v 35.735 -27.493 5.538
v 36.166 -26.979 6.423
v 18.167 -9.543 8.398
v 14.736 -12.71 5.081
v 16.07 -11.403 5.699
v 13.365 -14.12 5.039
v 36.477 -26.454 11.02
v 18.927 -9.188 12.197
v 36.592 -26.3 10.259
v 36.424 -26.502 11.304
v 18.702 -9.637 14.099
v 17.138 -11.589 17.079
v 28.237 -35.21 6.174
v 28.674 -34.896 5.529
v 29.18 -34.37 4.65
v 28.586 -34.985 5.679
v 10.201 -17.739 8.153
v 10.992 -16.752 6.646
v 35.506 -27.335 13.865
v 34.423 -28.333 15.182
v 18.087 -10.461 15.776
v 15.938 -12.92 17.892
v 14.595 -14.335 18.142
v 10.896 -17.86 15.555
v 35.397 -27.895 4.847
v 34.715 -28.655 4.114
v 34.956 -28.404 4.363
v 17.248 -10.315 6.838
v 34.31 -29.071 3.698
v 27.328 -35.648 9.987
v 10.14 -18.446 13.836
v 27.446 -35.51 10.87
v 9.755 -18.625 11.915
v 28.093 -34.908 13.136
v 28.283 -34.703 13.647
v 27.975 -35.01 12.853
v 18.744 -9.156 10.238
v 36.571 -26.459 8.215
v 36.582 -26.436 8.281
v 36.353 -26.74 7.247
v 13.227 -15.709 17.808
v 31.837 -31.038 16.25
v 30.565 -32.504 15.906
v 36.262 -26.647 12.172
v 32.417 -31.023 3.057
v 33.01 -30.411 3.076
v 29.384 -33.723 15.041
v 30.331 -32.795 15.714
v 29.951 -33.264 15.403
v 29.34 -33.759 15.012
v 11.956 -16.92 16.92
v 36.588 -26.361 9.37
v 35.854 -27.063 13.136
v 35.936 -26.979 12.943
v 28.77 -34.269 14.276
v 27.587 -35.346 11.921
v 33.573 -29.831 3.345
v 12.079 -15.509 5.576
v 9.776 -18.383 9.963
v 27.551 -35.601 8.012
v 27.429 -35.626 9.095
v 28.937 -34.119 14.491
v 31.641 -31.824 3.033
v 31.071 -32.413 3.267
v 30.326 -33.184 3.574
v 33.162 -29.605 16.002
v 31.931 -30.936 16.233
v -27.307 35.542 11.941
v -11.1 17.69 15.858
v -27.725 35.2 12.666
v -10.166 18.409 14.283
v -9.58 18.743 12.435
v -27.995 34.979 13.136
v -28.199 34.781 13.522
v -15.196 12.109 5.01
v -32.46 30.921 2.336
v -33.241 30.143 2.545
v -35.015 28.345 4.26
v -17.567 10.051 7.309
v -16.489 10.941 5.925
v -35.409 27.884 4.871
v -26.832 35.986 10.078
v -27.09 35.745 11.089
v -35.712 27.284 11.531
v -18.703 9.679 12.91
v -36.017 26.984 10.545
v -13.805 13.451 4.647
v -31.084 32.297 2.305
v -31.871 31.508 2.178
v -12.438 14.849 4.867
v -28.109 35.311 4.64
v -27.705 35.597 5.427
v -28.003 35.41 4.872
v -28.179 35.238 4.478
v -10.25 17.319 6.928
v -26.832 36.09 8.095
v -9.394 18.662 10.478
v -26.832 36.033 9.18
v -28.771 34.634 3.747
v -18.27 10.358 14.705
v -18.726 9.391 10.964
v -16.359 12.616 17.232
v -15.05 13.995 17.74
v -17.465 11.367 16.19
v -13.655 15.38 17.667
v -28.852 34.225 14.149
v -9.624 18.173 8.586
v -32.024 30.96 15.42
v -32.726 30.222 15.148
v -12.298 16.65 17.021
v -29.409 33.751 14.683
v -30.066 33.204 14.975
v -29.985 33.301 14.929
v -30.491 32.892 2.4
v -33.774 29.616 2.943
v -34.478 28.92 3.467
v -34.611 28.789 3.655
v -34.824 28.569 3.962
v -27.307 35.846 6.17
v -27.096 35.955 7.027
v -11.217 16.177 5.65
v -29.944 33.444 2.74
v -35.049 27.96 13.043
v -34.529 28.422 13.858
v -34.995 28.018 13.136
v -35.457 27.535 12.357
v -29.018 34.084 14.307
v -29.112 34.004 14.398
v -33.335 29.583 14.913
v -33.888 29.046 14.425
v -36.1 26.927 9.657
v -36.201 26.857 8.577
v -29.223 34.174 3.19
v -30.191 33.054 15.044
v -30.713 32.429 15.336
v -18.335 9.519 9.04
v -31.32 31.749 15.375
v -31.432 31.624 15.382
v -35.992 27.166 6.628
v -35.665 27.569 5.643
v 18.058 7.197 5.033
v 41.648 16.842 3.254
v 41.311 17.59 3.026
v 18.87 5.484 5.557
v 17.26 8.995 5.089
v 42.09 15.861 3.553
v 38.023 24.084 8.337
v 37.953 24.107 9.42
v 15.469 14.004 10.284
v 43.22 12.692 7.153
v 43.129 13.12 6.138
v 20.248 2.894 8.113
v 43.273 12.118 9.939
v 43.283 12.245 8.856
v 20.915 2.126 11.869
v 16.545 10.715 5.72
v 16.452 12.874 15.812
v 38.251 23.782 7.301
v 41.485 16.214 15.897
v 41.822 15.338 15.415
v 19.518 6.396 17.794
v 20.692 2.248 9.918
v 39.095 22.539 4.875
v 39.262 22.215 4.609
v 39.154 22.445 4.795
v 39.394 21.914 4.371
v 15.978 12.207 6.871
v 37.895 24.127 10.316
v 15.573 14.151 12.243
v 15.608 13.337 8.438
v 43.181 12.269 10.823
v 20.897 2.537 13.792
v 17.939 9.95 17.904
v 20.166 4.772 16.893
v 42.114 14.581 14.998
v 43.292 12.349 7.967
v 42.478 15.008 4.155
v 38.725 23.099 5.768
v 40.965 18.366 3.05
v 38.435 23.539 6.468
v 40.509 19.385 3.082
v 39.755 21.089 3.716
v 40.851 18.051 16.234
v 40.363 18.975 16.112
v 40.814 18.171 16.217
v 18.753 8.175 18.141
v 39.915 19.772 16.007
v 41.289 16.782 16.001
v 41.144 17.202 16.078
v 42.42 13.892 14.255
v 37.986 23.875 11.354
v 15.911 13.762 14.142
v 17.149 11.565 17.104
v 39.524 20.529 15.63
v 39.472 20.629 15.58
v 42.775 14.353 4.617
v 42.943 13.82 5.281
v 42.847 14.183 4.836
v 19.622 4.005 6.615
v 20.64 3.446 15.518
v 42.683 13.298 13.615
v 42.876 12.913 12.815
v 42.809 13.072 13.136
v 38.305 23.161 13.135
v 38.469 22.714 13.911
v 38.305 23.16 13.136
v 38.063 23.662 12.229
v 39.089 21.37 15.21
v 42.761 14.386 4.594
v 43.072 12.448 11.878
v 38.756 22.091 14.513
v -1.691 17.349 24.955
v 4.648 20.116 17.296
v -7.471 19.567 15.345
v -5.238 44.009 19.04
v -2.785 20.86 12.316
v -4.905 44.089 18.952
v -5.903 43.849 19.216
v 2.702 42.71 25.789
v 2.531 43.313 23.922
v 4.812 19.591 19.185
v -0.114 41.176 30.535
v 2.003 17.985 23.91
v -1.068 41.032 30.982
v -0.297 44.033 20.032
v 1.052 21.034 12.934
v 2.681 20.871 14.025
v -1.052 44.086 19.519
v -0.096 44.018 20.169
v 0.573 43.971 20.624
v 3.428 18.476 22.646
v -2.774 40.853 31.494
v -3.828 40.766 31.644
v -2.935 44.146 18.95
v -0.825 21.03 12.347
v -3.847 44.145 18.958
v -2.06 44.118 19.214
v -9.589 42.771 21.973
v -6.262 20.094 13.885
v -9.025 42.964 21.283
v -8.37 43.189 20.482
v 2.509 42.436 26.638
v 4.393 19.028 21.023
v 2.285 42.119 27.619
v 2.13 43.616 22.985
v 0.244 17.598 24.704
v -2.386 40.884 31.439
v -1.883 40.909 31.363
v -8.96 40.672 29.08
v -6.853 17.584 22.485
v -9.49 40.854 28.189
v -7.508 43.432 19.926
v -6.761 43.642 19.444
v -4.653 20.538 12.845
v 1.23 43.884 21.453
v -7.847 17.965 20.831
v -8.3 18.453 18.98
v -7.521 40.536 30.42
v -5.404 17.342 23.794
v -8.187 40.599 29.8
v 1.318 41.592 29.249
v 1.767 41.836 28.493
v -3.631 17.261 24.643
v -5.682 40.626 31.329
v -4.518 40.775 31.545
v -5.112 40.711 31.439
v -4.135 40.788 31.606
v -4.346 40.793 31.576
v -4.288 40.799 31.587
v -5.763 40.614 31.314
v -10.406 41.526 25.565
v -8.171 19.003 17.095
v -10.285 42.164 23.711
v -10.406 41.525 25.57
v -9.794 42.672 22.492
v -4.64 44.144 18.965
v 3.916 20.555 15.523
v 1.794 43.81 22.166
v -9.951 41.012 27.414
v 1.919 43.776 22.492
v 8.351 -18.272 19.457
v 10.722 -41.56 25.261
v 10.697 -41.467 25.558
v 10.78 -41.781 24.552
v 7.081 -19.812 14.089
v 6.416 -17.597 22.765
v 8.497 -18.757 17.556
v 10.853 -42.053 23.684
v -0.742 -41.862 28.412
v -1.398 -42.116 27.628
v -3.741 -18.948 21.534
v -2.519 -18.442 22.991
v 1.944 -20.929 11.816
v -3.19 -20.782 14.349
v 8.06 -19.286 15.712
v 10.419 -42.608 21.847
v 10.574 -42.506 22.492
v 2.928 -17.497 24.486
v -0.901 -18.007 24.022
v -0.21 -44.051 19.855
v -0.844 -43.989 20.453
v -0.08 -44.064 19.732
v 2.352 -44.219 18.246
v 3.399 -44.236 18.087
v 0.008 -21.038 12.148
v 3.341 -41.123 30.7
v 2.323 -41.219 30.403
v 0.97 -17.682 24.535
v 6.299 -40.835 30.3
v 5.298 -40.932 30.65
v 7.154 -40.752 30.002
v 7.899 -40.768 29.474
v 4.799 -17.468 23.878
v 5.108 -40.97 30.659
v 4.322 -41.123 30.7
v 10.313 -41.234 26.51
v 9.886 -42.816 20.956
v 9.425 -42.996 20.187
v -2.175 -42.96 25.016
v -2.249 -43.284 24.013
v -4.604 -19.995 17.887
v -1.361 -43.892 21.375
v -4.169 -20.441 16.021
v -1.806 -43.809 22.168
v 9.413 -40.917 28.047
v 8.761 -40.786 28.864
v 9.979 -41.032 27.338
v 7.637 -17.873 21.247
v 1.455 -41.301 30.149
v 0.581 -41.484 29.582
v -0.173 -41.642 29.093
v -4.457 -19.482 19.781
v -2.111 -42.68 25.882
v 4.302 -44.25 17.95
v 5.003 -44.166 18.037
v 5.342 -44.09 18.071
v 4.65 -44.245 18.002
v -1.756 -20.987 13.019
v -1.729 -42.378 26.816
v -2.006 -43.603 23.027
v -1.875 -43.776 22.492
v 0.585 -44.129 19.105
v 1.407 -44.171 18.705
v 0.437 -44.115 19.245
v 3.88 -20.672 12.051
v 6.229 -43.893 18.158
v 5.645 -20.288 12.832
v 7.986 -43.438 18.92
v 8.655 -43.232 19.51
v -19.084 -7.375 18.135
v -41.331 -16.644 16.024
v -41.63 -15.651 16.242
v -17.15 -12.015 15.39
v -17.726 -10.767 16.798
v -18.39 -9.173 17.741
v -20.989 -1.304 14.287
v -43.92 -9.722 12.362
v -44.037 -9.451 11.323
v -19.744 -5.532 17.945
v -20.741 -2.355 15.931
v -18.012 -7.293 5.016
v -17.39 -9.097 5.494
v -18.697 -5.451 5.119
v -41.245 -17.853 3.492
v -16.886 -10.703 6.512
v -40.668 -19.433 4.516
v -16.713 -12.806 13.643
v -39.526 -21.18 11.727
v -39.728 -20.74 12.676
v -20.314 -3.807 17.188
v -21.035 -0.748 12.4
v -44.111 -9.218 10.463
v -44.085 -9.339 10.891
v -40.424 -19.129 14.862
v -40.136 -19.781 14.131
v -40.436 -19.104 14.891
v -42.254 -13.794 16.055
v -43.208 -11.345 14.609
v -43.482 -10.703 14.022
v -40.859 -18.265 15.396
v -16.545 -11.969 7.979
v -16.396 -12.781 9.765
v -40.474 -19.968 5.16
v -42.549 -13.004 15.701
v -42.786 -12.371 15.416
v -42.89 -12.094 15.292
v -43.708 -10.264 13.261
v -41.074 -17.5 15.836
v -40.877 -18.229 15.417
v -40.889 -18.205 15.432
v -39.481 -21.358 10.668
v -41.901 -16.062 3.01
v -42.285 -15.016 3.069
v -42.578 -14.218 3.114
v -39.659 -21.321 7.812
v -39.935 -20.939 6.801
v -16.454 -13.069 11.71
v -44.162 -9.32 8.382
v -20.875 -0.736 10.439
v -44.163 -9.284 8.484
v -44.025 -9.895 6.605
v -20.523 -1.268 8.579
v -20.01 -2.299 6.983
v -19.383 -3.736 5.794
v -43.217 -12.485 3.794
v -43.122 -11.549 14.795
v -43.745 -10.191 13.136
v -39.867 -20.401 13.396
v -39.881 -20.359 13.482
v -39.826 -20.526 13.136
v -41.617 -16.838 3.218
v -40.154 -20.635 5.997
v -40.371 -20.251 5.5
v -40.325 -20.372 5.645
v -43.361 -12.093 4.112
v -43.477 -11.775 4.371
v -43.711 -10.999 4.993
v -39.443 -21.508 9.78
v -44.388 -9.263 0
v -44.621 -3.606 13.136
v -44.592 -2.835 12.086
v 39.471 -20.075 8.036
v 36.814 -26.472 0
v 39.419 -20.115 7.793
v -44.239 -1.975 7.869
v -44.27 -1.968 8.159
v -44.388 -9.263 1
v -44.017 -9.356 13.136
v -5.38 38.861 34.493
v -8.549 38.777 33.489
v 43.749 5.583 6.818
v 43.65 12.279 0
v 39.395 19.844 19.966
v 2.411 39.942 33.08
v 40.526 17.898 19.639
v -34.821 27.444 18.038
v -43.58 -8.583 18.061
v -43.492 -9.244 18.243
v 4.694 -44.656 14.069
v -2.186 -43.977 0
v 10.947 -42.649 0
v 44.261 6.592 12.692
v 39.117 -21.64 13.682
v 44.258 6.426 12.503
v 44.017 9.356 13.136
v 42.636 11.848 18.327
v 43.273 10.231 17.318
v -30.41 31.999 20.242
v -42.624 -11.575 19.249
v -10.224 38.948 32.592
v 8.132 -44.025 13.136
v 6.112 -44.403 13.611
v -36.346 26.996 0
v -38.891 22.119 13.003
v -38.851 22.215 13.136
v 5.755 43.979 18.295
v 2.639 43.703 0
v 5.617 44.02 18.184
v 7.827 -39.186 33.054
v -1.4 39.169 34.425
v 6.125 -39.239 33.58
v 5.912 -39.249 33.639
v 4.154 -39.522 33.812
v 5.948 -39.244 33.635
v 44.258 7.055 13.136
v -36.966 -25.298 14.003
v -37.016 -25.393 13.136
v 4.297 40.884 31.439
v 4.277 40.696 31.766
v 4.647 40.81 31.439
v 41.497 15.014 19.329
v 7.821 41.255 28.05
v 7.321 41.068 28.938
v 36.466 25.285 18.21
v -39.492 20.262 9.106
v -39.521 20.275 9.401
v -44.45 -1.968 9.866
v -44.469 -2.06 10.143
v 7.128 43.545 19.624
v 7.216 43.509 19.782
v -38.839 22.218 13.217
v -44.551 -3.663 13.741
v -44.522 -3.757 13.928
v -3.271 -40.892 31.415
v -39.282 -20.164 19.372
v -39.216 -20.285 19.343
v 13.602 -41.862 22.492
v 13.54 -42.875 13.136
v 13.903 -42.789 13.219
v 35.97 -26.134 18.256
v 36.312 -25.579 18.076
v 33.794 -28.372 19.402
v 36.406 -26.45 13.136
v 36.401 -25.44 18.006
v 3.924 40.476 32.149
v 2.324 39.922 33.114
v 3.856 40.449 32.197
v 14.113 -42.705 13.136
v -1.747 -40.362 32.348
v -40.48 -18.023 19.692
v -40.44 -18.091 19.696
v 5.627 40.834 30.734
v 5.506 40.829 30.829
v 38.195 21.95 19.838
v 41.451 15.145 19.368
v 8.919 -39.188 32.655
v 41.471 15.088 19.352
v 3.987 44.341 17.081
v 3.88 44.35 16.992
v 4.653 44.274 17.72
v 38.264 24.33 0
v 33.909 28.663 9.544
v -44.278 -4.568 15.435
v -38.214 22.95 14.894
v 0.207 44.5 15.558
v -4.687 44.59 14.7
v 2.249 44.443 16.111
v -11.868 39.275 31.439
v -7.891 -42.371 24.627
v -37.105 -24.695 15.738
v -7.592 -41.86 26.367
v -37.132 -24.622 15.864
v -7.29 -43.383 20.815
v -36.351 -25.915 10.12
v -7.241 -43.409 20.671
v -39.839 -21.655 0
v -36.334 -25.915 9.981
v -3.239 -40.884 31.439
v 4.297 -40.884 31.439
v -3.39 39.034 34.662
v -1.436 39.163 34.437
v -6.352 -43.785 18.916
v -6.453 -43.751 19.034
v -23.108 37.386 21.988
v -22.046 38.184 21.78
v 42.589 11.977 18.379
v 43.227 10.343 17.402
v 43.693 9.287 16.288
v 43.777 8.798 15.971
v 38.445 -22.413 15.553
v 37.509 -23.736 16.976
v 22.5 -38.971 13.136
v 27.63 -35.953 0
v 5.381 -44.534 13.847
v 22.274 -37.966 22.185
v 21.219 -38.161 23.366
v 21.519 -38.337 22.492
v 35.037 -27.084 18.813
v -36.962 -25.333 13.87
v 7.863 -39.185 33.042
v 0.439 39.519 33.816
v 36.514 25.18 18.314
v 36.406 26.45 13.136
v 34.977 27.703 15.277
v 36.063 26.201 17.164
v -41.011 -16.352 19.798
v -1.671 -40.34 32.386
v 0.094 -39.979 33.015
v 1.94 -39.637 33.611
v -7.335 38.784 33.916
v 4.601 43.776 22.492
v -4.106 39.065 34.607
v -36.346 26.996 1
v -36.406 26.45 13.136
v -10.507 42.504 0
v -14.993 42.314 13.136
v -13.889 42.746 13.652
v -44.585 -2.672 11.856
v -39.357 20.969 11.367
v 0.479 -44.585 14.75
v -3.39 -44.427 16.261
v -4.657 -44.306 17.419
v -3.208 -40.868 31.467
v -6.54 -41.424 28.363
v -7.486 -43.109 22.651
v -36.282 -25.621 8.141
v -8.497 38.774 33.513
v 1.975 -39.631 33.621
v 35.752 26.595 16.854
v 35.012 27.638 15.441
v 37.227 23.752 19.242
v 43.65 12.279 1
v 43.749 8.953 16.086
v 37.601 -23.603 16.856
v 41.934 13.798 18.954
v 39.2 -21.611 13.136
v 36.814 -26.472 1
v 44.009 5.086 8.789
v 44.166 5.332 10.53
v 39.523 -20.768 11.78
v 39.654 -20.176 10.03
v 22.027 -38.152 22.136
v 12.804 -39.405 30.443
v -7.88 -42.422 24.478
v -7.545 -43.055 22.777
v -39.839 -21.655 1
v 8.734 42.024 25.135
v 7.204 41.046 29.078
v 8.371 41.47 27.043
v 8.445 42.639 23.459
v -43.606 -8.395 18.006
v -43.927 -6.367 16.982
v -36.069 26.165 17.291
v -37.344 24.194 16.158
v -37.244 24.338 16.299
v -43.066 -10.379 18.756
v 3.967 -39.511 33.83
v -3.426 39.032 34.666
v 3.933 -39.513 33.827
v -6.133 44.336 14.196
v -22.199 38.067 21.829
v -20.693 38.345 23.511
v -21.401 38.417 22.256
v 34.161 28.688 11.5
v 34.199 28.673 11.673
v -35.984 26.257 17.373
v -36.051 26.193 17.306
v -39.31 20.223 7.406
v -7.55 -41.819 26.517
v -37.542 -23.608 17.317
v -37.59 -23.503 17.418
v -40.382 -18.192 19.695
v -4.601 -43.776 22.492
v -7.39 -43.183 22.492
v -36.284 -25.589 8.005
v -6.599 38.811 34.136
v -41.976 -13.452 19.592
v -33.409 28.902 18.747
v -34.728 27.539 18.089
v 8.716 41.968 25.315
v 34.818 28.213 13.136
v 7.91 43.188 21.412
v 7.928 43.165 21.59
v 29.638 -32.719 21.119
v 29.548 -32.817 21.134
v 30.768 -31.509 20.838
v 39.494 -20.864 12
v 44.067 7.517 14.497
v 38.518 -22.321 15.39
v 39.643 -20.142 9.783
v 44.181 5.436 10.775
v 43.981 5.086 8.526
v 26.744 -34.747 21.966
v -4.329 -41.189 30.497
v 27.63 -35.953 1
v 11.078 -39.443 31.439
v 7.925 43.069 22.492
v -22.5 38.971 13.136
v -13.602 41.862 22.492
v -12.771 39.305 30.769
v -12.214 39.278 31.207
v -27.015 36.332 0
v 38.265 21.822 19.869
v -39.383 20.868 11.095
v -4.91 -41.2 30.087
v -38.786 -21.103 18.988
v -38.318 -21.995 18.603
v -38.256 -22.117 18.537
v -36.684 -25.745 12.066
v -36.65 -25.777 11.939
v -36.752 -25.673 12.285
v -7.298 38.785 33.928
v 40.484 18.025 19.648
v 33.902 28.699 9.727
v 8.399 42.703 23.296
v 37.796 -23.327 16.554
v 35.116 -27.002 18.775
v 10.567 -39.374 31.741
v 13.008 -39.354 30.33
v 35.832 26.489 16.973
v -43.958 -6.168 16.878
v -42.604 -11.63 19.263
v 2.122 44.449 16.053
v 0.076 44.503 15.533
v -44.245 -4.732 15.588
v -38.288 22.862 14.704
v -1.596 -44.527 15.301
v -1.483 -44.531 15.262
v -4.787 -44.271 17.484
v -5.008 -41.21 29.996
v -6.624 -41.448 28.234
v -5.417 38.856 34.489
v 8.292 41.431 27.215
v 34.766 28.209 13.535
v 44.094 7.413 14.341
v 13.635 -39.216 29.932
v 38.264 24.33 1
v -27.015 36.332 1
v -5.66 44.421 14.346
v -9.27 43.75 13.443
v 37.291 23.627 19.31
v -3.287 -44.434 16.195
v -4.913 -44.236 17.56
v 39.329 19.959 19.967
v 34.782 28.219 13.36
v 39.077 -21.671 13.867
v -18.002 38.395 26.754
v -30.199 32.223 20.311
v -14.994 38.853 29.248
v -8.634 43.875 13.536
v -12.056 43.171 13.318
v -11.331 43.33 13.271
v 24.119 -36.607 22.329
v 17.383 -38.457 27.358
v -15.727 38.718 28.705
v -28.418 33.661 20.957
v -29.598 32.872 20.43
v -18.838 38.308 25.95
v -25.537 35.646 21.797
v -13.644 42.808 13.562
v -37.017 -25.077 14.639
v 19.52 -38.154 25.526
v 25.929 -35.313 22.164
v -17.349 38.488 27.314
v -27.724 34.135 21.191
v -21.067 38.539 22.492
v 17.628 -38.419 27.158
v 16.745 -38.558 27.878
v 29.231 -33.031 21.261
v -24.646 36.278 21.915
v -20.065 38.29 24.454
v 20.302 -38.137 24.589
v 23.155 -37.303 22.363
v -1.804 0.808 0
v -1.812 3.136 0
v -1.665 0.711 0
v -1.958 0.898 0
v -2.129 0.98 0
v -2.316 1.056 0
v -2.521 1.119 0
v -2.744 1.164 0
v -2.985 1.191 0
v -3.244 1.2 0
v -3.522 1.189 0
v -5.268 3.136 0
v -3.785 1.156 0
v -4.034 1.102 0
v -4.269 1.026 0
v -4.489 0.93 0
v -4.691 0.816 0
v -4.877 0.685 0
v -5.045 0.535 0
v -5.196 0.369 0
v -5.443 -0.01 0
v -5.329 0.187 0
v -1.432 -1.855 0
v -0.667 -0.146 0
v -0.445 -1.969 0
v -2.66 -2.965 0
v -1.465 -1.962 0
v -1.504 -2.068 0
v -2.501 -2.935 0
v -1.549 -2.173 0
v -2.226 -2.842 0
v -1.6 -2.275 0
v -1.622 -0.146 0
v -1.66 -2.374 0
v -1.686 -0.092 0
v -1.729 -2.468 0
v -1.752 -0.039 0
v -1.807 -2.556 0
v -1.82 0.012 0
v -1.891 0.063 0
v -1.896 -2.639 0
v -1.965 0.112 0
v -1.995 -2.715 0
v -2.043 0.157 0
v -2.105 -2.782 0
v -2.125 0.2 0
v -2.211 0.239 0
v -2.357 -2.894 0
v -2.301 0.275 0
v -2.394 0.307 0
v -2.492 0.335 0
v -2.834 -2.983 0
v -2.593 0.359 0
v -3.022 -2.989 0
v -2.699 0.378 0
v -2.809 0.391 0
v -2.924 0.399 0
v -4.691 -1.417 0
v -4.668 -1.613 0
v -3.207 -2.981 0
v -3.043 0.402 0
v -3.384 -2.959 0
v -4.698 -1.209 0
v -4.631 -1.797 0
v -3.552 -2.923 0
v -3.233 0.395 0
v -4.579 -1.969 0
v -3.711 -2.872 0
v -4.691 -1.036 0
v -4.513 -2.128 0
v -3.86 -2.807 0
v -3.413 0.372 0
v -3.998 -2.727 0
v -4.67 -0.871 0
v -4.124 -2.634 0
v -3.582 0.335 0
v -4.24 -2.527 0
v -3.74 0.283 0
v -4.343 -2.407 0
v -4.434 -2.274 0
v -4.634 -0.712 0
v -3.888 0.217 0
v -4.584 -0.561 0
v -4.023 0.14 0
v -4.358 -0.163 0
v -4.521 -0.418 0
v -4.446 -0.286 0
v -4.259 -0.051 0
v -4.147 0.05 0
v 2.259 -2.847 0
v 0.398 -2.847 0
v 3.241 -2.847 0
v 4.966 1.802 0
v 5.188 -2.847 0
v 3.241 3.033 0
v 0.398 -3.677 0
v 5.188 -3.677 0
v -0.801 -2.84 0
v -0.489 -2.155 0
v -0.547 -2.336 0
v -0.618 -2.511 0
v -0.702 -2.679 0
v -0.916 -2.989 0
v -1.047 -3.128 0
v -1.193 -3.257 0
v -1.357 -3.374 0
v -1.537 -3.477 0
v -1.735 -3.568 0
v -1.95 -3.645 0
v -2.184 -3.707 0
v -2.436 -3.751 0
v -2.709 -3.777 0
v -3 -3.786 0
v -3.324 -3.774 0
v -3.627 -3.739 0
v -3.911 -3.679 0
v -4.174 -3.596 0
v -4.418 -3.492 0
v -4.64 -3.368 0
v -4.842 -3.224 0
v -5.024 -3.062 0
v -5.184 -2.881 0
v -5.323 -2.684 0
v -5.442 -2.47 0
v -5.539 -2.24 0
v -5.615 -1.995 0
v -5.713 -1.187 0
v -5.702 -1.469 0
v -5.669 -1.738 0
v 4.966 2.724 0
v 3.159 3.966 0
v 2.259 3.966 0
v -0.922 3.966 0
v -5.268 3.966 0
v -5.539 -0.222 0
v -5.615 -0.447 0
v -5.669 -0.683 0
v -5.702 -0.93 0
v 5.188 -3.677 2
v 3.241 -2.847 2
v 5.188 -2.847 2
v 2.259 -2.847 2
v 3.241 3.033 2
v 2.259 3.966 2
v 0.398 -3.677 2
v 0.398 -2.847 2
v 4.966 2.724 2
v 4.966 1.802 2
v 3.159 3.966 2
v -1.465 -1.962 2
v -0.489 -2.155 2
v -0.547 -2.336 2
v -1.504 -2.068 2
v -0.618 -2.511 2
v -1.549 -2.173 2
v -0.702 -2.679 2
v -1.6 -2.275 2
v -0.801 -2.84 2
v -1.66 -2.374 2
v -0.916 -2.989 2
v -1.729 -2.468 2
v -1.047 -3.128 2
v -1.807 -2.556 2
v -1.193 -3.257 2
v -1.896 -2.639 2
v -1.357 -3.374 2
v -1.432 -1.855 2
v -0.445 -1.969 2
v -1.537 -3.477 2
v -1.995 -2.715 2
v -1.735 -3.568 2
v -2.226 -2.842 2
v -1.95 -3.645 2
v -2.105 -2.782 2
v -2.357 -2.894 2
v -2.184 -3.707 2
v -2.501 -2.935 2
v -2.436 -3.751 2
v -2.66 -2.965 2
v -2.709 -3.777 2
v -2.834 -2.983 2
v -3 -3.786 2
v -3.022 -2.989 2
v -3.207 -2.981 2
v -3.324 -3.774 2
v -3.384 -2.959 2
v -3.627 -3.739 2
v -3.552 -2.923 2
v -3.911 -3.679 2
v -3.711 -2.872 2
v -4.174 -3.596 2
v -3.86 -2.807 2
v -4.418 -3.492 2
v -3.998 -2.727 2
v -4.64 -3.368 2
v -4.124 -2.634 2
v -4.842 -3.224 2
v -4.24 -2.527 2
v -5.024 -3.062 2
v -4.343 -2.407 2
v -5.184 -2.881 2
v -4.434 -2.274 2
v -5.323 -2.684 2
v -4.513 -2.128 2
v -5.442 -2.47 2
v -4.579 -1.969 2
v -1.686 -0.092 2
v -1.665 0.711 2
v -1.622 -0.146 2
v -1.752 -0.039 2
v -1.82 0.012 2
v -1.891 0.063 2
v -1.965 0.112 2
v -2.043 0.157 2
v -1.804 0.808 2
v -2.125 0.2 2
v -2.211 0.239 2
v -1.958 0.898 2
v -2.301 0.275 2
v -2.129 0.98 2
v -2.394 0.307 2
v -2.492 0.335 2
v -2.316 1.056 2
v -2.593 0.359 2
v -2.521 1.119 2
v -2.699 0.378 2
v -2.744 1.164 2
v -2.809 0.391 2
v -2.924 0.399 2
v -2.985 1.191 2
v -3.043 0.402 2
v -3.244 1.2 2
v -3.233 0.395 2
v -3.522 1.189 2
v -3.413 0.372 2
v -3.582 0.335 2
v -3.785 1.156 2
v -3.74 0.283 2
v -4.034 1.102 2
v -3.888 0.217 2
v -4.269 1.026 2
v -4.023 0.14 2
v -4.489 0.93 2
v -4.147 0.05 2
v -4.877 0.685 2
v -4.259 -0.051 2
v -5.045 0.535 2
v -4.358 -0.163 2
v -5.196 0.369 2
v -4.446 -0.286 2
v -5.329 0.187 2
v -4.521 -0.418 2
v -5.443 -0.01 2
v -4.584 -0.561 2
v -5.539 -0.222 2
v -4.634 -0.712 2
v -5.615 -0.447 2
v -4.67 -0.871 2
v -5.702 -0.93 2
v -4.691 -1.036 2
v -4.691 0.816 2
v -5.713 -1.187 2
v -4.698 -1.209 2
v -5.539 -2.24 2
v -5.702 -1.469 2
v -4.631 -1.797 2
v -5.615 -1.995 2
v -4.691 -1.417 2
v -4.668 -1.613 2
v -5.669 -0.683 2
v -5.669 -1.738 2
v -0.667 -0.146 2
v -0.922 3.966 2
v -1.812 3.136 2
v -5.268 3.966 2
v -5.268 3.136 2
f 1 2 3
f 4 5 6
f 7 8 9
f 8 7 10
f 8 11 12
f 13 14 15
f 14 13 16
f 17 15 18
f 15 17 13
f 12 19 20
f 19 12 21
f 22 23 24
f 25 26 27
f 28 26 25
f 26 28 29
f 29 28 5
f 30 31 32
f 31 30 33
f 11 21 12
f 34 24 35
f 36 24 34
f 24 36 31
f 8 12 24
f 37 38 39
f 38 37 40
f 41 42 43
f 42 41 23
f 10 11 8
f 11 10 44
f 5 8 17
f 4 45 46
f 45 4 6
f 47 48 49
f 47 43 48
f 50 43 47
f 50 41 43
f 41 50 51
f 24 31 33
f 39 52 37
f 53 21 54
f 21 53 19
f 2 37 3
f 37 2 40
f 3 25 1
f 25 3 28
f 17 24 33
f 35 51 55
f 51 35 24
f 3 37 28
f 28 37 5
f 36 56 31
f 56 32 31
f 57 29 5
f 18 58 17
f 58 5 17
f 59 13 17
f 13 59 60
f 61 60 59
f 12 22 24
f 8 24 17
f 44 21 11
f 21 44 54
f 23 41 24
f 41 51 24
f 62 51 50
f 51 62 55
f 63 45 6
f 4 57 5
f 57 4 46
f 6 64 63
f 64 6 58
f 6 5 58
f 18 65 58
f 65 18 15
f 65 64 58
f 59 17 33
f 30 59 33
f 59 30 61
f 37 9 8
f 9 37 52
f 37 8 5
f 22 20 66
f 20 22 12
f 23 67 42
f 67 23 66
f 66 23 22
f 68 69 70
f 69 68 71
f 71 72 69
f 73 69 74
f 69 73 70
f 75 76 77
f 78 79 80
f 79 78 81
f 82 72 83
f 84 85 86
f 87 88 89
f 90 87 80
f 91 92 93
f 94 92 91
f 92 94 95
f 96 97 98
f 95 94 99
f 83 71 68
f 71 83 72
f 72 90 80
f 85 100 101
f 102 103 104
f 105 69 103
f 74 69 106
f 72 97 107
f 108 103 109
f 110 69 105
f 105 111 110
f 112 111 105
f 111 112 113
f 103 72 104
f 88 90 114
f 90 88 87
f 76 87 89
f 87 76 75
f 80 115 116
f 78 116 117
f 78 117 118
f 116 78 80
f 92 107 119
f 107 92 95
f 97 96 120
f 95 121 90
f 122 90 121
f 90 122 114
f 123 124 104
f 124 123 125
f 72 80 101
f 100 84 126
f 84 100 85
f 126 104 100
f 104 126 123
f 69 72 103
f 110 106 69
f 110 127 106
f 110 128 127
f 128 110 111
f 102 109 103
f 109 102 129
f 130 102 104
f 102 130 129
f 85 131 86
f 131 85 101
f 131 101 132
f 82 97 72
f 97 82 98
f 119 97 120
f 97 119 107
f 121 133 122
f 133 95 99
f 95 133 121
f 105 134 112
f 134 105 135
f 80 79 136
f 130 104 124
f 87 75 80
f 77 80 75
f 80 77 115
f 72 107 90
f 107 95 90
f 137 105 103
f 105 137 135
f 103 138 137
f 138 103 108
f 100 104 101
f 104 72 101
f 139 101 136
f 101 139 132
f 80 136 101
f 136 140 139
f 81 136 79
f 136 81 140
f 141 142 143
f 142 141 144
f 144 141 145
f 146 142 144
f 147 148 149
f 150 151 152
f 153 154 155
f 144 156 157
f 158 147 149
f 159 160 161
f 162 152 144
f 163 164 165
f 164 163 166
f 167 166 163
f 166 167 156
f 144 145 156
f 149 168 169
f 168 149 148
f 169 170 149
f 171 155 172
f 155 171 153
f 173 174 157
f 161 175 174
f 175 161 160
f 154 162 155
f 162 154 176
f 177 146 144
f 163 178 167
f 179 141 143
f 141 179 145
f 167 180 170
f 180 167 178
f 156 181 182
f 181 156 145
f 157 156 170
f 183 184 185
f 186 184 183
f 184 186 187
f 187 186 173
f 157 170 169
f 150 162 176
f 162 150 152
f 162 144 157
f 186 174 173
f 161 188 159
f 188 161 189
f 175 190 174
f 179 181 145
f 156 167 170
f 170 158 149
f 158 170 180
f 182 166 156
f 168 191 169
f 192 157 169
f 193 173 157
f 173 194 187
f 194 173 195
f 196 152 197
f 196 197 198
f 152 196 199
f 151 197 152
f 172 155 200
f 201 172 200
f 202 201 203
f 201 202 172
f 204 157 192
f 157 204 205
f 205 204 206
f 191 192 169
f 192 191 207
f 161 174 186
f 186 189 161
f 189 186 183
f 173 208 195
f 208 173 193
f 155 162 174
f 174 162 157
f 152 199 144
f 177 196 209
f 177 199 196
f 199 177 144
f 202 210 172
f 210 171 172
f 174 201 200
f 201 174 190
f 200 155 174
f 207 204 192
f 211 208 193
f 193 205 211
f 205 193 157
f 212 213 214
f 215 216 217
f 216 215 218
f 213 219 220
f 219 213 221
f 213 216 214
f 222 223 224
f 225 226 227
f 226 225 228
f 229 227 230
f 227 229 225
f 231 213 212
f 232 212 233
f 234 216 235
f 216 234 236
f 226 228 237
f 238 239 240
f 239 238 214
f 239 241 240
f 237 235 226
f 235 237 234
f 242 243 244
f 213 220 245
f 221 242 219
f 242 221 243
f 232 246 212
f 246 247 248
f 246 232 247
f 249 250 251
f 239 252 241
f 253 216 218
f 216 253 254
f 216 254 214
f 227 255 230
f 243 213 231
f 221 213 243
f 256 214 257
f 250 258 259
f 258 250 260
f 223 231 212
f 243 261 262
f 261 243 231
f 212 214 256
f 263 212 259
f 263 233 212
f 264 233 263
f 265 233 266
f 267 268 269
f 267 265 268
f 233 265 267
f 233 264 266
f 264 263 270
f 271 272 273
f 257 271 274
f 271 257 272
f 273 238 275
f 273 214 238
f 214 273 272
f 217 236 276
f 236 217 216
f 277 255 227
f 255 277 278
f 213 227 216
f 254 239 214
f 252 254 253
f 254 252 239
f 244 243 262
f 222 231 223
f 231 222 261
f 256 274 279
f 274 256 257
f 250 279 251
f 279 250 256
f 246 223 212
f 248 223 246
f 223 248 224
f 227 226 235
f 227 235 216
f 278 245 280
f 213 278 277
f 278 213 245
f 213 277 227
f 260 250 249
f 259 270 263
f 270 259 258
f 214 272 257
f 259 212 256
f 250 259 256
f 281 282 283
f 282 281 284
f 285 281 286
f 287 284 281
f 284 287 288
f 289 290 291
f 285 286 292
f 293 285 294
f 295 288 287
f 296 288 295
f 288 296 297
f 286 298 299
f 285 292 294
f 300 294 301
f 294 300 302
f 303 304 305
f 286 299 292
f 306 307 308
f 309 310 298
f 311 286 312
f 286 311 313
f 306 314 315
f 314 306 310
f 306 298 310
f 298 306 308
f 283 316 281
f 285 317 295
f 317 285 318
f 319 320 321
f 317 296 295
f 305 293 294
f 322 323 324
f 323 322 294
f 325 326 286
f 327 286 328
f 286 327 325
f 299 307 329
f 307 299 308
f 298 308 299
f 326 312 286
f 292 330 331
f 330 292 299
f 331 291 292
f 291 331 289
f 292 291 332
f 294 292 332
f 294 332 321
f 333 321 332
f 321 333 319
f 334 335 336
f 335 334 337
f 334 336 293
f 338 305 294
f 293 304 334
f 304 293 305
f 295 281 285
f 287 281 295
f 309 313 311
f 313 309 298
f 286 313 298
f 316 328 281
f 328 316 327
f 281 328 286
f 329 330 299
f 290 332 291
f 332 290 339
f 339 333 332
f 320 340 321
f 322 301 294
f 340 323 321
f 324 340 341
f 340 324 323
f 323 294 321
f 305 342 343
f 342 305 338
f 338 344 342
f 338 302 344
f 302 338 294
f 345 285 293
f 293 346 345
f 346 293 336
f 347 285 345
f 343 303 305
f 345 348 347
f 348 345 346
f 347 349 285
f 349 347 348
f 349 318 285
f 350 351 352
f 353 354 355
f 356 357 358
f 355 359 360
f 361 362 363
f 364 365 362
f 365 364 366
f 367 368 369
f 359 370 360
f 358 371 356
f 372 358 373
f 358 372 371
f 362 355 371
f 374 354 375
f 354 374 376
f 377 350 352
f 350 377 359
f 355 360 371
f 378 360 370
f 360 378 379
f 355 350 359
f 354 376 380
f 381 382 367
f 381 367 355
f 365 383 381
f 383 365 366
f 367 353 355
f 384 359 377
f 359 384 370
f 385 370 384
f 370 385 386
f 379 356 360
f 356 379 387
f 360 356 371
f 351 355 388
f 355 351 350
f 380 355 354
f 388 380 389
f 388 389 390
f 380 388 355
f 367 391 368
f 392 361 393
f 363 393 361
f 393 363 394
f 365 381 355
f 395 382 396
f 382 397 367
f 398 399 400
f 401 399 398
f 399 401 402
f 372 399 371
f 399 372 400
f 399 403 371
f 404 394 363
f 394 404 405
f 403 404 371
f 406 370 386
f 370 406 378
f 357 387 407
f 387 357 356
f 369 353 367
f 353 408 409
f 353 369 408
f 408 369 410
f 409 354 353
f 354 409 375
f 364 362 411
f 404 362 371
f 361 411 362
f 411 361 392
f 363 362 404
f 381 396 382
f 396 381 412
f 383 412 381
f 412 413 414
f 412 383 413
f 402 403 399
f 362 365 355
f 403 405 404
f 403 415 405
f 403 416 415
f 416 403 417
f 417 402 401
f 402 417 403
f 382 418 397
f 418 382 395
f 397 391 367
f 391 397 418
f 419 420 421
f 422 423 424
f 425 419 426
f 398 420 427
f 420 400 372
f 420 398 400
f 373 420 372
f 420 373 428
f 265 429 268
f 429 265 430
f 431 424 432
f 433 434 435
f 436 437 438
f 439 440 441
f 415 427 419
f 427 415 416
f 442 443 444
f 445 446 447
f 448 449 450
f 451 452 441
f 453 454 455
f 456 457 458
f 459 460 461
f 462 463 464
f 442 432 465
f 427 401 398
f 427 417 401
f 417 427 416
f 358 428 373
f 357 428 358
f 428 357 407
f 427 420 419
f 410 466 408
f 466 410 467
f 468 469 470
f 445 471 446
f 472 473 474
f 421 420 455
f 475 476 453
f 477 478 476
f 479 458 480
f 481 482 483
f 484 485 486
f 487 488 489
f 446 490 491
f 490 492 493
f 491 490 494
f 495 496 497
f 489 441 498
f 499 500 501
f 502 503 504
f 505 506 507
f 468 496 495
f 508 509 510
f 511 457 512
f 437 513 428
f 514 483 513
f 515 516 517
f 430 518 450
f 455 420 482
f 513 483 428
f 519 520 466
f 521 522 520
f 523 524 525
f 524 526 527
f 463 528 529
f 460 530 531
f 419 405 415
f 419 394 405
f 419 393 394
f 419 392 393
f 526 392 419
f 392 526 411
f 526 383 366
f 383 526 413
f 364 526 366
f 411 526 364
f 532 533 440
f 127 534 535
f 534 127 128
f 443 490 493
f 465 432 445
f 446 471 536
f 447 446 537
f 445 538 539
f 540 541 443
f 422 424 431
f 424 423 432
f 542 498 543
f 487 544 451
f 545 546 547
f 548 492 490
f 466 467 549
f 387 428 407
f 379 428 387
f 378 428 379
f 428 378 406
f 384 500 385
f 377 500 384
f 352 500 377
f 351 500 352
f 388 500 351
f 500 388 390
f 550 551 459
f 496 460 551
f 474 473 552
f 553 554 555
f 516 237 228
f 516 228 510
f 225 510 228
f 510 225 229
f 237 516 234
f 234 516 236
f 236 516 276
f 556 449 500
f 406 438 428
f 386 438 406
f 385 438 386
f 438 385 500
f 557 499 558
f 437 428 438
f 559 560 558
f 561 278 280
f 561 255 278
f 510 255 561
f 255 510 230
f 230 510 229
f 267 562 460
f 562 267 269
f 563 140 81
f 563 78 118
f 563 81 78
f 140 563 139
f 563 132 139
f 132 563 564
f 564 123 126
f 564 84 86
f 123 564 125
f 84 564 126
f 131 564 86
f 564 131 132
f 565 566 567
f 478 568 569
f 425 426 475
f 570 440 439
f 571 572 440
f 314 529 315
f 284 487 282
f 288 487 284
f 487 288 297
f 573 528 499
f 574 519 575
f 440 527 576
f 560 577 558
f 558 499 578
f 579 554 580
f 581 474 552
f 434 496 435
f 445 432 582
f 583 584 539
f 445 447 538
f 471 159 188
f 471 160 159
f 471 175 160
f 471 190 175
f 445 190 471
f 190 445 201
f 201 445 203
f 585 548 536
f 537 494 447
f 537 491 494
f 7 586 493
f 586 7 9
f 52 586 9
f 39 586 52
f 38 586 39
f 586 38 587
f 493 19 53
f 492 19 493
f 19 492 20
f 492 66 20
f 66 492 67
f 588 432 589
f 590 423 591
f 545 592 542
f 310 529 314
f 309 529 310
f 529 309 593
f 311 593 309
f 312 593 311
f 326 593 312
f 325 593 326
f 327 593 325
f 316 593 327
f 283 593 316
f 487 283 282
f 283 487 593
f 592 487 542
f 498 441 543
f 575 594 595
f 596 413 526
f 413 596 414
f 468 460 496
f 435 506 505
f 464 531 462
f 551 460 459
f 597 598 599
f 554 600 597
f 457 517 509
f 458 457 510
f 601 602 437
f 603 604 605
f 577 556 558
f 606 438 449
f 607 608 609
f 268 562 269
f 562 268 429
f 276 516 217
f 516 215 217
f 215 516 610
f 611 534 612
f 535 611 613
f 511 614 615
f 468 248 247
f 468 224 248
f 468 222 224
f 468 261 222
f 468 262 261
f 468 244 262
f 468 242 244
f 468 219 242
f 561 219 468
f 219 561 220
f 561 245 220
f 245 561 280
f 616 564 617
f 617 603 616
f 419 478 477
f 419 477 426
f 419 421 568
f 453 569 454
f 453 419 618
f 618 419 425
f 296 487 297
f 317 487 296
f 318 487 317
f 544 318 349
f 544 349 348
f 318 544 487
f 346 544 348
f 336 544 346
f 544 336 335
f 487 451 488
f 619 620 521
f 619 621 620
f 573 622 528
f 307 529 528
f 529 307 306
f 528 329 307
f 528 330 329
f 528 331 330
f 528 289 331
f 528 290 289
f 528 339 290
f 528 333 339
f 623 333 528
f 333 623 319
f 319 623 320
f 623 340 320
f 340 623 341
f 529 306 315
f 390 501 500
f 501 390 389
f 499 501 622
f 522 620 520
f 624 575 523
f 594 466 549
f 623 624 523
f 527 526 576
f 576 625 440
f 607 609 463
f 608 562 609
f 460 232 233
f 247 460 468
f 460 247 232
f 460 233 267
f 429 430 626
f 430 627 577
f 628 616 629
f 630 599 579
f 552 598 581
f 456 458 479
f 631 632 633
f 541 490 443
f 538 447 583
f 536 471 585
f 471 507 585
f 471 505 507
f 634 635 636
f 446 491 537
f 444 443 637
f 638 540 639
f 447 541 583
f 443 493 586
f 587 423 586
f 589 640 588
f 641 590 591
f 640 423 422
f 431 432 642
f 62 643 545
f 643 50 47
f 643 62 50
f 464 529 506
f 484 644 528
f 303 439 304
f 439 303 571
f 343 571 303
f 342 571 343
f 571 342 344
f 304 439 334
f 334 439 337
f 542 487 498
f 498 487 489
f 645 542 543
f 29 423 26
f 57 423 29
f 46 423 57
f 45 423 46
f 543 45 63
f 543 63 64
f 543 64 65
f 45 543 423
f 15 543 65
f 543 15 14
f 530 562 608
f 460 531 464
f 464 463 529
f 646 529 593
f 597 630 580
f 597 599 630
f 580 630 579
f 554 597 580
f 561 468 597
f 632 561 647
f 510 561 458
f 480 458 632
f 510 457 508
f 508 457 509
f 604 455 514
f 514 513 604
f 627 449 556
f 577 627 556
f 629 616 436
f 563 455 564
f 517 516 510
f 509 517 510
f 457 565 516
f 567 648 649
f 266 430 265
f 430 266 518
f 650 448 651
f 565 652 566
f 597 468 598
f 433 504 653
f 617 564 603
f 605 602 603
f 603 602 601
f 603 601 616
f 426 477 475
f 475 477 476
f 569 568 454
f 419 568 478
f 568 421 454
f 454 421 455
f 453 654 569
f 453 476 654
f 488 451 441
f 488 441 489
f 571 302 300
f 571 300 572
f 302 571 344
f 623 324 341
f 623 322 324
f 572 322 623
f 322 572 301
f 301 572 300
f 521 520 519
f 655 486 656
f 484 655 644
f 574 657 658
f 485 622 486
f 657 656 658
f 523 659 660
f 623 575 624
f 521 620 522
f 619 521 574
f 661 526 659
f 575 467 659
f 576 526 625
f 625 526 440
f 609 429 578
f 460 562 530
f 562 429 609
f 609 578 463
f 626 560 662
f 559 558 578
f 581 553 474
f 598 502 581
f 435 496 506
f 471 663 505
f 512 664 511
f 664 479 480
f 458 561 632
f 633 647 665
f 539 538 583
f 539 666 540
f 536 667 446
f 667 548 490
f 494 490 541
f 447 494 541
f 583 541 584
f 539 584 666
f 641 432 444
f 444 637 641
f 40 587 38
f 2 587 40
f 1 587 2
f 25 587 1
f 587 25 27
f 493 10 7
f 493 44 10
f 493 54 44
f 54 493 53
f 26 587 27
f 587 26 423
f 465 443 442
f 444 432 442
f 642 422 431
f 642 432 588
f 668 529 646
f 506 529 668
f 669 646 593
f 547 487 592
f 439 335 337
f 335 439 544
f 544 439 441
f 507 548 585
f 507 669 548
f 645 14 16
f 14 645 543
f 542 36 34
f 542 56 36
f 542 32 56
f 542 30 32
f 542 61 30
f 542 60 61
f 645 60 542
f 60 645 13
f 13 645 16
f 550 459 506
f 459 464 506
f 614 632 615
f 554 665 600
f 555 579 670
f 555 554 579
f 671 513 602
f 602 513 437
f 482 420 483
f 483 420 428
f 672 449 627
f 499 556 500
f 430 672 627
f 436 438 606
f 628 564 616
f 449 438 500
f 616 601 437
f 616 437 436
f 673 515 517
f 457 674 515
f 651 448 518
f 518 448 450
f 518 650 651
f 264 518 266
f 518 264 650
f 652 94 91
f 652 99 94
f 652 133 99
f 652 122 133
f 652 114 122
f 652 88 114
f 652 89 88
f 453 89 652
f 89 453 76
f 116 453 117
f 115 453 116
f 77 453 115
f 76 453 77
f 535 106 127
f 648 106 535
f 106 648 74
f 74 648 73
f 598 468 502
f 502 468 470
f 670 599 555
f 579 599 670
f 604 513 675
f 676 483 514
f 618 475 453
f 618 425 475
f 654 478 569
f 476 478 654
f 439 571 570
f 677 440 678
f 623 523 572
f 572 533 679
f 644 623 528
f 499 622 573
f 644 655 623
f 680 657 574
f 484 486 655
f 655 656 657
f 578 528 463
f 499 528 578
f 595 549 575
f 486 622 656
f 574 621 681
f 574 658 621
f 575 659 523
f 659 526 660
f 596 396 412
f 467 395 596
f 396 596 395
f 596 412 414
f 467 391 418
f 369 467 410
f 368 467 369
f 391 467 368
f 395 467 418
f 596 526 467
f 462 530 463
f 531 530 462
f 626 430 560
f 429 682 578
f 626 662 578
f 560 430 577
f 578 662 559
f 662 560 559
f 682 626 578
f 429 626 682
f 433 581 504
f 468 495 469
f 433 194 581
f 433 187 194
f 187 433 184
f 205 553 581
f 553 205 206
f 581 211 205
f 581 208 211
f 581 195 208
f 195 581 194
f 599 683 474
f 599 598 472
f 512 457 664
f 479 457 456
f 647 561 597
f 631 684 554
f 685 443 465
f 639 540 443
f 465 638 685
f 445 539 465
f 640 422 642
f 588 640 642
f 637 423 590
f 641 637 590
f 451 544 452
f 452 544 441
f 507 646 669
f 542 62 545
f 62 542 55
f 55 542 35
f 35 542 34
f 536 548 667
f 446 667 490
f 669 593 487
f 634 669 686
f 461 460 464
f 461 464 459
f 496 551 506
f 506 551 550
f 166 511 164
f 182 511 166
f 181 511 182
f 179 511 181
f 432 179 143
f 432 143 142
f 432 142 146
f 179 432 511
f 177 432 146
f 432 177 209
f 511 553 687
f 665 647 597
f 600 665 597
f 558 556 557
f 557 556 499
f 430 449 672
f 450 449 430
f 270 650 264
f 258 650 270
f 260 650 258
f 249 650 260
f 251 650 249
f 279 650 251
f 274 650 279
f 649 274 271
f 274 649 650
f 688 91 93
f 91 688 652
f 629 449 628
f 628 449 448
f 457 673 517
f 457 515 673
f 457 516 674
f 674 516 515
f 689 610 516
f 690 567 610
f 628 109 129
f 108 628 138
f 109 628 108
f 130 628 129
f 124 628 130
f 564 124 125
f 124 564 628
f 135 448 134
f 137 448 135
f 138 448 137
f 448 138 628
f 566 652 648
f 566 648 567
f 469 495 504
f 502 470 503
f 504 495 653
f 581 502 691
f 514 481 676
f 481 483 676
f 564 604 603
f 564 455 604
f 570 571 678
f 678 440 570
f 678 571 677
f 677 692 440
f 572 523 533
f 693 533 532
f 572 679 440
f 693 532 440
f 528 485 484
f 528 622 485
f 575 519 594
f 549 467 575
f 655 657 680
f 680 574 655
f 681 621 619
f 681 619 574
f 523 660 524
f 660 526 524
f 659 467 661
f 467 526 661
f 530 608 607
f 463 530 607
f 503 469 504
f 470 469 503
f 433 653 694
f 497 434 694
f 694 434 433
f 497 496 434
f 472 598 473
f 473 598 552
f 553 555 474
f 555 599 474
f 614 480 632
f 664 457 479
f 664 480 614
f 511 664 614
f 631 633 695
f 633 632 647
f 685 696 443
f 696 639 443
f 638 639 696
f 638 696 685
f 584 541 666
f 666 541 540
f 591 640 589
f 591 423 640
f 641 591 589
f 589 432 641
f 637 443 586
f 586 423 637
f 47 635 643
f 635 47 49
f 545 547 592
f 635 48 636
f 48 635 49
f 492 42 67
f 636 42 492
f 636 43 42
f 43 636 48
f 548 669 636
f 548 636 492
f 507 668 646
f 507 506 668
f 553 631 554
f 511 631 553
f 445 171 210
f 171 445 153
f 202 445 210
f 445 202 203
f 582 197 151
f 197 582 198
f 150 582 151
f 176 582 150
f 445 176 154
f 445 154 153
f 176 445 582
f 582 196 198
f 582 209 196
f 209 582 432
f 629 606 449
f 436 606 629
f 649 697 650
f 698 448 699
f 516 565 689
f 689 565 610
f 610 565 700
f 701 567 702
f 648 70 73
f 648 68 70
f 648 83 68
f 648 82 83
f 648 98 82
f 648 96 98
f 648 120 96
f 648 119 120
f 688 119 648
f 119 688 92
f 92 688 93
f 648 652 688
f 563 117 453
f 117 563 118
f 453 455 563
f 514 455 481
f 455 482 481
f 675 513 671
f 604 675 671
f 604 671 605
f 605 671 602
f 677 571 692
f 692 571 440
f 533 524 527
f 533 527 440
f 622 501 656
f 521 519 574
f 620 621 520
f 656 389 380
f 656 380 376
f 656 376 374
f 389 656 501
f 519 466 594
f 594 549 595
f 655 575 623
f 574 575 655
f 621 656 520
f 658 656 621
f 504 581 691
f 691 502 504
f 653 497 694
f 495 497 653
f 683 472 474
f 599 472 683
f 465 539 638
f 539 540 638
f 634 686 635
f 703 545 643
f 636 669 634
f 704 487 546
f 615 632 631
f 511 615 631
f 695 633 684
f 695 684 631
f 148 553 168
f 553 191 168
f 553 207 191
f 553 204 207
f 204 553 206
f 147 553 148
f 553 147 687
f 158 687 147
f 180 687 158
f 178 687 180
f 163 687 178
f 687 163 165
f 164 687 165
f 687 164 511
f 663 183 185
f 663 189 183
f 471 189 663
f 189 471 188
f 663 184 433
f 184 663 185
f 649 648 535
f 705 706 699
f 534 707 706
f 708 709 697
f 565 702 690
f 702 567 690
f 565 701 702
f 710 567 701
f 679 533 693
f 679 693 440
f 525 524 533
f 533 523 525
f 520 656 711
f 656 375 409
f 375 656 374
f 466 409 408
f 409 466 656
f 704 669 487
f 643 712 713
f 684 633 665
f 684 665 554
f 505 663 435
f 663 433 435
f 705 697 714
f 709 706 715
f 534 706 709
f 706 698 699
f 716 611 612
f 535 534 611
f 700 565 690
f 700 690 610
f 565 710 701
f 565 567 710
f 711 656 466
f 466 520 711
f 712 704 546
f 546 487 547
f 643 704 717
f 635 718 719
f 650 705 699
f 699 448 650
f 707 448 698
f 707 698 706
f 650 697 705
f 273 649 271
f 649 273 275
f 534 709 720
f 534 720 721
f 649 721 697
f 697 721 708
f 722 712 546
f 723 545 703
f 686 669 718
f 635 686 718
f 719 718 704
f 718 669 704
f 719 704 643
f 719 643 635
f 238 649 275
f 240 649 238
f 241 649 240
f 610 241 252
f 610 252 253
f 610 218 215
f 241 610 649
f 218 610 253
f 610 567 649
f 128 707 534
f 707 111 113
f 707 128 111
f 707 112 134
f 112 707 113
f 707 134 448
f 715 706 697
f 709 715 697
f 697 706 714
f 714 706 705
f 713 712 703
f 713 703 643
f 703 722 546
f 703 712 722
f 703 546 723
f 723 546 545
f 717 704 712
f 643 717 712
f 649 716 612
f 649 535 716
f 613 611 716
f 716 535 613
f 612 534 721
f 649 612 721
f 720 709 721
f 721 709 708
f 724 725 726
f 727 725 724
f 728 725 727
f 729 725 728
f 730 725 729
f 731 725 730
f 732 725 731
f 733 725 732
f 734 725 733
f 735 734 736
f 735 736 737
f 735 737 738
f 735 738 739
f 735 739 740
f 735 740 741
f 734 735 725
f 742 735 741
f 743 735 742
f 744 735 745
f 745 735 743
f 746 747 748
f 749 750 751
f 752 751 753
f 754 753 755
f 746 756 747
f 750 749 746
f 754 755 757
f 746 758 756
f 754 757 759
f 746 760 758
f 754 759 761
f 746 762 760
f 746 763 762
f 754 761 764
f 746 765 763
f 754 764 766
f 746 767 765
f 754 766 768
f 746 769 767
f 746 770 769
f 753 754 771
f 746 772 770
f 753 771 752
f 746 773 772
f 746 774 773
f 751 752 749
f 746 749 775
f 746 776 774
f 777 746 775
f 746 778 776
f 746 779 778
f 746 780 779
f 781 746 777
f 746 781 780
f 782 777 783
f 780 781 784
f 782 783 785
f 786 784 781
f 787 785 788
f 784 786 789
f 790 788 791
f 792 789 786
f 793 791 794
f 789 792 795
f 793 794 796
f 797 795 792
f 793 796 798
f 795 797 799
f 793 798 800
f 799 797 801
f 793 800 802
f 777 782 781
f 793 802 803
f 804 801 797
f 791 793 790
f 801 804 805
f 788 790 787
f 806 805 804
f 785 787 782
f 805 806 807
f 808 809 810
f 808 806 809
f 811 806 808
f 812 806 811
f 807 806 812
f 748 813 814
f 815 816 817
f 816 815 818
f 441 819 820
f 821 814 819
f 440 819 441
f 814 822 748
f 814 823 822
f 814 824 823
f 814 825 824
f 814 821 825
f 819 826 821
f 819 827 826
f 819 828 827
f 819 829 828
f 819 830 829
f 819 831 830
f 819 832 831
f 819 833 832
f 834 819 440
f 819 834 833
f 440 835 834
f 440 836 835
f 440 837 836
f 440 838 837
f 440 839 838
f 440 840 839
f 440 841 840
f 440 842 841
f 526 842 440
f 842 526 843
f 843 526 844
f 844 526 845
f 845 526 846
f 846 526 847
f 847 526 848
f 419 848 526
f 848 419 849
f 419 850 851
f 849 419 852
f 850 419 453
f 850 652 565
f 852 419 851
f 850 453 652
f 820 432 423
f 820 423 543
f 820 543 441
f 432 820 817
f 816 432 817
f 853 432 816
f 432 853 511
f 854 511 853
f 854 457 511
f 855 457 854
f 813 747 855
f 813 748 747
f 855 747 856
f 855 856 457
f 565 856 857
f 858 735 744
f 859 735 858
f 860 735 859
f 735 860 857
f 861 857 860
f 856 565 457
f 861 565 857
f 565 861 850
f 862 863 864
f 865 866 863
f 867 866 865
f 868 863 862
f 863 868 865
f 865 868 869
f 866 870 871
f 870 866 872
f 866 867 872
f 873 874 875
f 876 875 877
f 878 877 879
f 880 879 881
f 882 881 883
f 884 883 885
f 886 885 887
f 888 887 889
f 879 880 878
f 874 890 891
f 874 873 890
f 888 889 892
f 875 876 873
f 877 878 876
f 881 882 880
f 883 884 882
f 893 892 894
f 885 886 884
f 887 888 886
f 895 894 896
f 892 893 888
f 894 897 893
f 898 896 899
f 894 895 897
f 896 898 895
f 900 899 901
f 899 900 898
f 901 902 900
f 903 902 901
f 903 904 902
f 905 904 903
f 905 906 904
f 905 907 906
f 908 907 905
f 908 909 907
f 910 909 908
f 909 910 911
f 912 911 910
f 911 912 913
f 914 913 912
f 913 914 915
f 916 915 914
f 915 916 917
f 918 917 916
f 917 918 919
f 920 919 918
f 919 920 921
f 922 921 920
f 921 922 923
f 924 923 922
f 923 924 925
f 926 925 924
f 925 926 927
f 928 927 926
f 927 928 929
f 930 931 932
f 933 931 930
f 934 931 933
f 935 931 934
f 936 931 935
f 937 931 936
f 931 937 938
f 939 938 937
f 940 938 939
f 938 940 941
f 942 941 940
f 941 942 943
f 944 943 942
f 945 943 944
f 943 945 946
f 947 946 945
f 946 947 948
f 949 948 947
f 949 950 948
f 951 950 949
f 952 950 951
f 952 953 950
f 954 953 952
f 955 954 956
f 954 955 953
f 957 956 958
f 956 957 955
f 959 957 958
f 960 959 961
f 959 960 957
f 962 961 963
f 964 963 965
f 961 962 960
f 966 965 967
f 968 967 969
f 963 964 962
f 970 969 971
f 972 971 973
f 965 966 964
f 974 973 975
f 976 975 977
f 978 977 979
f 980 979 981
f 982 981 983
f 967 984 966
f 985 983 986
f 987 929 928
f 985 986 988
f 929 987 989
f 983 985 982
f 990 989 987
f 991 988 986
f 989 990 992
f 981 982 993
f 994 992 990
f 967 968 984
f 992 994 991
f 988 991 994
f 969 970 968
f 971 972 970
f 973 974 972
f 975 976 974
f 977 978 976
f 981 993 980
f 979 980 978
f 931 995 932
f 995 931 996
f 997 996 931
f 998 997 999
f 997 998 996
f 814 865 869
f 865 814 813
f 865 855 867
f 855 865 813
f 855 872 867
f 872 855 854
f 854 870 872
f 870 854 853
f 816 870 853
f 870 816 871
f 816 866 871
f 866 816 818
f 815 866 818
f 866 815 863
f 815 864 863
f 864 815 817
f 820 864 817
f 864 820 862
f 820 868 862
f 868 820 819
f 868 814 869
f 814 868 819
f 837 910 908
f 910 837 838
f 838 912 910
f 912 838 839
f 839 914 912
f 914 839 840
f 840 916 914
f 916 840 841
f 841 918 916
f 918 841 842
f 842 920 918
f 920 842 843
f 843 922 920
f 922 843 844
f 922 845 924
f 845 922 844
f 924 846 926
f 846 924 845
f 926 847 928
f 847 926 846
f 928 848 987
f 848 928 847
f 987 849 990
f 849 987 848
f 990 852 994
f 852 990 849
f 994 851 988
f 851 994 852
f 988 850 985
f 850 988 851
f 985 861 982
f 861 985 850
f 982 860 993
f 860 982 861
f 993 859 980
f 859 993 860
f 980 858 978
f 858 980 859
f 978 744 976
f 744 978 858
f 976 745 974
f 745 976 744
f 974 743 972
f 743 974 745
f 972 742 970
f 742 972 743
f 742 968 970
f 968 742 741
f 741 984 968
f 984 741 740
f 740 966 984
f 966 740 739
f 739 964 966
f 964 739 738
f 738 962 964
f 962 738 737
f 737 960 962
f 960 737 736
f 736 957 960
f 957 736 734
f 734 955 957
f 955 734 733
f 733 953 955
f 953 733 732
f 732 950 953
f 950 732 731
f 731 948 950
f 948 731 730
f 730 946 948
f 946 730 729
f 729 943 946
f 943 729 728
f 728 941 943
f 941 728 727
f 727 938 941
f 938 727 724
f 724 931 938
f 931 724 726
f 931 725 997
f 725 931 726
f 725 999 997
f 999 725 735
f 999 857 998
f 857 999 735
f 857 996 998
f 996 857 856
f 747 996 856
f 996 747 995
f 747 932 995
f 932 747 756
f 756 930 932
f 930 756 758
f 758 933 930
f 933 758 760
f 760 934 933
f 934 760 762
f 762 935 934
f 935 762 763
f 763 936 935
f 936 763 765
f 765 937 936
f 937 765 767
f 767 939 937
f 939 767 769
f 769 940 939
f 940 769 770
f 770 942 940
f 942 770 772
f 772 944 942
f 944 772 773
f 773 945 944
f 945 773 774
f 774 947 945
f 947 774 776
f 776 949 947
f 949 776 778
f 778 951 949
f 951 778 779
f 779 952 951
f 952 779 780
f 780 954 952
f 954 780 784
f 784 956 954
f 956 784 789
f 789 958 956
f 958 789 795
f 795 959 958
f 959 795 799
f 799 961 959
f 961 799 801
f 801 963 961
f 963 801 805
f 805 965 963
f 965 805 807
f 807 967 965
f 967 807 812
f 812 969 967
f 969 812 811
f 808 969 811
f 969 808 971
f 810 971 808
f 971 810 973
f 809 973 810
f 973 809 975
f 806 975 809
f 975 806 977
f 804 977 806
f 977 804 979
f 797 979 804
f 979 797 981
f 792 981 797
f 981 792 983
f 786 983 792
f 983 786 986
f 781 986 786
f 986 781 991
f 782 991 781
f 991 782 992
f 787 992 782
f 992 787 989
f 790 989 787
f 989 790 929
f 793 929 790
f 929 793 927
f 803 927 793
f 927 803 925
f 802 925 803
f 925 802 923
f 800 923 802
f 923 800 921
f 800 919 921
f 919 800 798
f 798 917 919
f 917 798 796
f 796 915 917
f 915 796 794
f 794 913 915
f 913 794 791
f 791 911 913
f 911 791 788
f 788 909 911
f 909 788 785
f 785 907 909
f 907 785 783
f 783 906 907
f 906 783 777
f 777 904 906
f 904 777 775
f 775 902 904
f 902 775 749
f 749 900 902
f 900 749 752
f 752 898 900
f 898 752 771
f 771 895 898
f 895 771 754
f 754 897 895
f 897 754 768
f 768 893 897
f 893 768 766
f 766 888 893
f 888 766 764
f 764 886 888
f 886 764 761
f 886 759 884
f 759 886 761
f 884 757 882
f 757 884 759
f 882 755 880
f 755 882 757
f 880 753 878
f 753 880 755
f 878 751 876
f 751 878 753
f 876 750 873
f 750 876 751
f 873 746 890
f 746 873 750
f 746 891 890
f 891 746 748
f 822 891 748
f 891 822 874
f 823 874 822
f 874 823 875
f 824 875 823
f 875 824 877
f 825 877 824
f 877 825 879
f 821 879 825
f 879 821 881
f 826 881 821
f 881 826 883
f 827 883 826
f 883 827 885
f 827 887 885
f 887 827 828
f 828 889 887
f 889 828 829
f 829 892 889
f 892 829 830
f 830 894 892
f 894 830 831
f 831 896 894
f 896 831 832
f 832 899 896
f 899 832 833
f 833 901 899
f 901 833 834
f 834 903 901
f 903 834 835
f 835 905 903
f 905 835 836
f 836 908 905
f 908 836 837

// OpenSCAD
difference() {
	difference() {
		difference() {
			hull() {
				union() {
					union() {
						rotate(a = -44.0885568165, v = [0, 0, 1]) {
							translate(v = [0, -6.6000000000, 0]) {
								cube(size = [44.8608913384, 13.2000000000, 1]);
							}
						}
						rotate(a = 135.0152083052, v = [0, 0, 1]) {
							translate(v = [0, -6.6000000000, 0]) {
								cube(size = [44.7913225372, 13.2000000000, 1]);
							}
						}
						rotate(a = 24.0809680797, v = [0, 0, 1]) {
							translate(v = [0, -6.6000000000, 0]) {
								cube(size = [44.8608917975, 13.2000000000, 1]);
							}
						}
						rotate(a = 95.2146620758, v = [0, 0, 1]) {
							translate(v = [0, -6.6000000000, 0]) {
								cube(size = [43.2827500793, 13.2000000000, 1]);
							}
						}
						rotate(a = -84.2254760666, v = [0, 0, 1]) {
							translate(v = [0, -6.6000000000, 0]) {
								cube(size = [43.5340646969, 13.2000000000, 1]);
							}
						}
						rotate(a = -159.8428584581, v = [0, 0, 1]) {
							translate(v = [0, -6.6000000000, 0]) {
								cube(size = [44.8608908767, 13.2000000000, 1]);
							}
						}
					}
					translate(v = [0, 0, 13.1355935708]) {
						intersection() {
							hull() {
								rotate(a = 94.5063018240, v = [0.6936184448, 0.7160449746, -0.0000014097]) {
									cylinder(h = 45, r = 9.6000000000);
								}
								rotate(a = 95.5199751218, v = [-0.7036409821, -0.7040144307, 0.0000014077]) {
									cylinder(h = 45, r = 9.6000000000);
								}
								rotate(a = 94.5062199855, v = [-0.4067659687, 0.9101475830, -0.0000005034]) {
									cylinder(h = 45, r = 9.6000000000);
								}
								rotate(a = 74.1203690177, v = [-0.9578577323, -0.0874193342, 0.0000010453]) {
									cylinder(h = 45, r = 9.6000000000);
								}
								rotate(a = 75.3352946970, v = [0.9625147646, 0.0973360357, -0.0000010599]) {
									cylinder(h = 45, r = 9.6000000000);
								}
								rotate(a = 94.5063841252, v = [0.3435307565, -0.9358489979, 0.0000005923]) {
									cylinder(h = 45, r = 9.6000000000);
								}
							}
							sphere(r = 45);
						}
					}
				}
			}
			translate(v = [0, 0, 13.1355935708]) {
				rotate(a = 94.5063018240, v = [0.6936184448, 0.7160449746, -0.0000014097]) {
					translate(v = [0, 0, 20]) {
						cylinder(h = 45, r = 6.6000000000);
					}
				}
				rotate(a = 95.5199751218, v = [-0.7036409821, -0.7040144307, 0.0000014077]) {
					translate(v = [0, 0, 20]) {
						cylinder(h = 45, r = 6.6000000000);
					}
				}
				rotate(a = 94.5062199855, v = [-0.4067659687, 0.9101475830, -0.0000005034]) {
					translate(v = [0, 0, 20]) {
						cylinder(h = 45, r = 6.6000000000);
					}
				}
				rotate(a = 74.1203690177, v = [-0.9578577323, -0.0874193342, 0.0000010453]) {
					translate(v = [0, 0, 20]) {
						cylinder(h = 45, r = 6.6000000000);
					}
				}
				rotate(a = 75.3352946970, v = [0.9625147646, 0.0973360357, -0.0000010599]) {
					translate(v = [0, 0, 20]) {
						cylinder(h = 45, r = 6.6000000000);
					}
				}
				rotate(a = 94.5063841252, v = [0.3435307565, -0.9358489979, 0.0000005923]) {
					translate(v = [0, 0, 20]) {
						cylinder(h = 45, r = 6.6000000000);
					}
				}
			}
		}
		translate(v = [-100, -100, -100]) {
			cube(size = [200, 200, 100]);
		}
	}
	translate(v = [0, 0, 2]) {
		rotate(a = 180, v = [0, 1, 0]) {
			linear_extrude(height = 3) {
				text(halign = "center", size = 8, text = "15", valign = "center");
			}
		}
	}
}
